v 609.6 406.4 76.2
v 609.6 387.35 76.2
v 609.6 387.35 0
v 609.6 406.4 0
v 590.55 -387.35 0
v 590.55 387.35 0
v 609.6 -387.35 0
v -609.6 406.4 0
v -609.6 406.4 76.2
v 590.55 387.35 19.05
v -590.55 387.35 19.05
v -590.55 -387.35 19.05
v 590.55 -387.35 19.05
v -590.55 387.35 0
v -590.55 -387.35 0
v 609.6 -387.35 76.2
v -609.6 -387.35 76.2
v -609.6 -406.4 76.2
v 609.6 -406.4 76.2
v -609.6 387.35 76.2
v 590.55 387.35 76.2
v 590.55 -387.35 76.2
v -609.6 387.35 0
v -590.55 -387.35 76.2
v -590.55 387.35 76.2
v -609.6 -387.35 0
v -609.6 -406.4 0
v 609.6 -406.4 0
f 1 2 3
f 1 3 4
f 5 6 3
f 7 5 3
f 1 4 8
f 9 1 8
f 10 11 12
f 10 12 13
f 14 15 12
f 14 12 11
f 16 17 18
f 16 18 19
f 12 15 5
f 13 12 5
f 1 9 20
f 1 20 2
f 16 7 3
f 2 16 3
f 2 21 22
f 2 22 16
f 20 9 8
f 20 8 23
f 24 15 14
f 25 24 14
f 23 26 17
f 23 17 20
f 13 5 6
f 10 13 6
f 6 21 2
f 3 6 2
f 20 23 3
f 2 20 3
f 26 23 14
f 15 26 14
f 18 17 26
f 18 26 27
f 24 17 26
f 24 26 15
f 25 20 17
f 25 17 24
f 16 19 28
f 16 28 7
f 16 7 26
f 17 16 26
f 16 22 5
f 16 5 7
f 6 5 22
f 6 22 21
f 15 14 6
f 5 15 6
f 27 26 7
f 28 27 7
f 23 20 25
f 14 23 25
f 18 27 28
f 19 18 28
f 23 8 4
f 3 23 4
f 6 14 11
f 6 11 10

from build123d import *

# Parameters (mm, degrees)
F2_W     = 1181.1
F2_H     = 774.7
F3_DEPTH = 19.05
F5_DEPTH = 76.2
F7_W     = 19.05
F7_H     = 774.7
F8_DEPTH = 76.2


with BuildPart() as f3:
    # F2 (on Top) → F3 (new body, through all)
    with BuildSketch(Plane.XY):
        Rectangle(F2_W, F2_H)
    extrude(amount=F3_DEPTH)


with BuildPart() as f5:
    # F4 (on Top) → F5 (new body, through all)
    with BuildSketch(Plane.XY):
        Polygon((590.55, -387.35), (-590.55, -387.35), (-609.6, -387.35), (-609.6, -406.4), (609.6, -406.4), (609.6, -387.35), align=None)
    extrude(amount=F5_DEPTH)


with BuildPart() as f5b:
    # F4 (on Top) → F5, piece 2 (new body, through all)
    with BuildSketch(Plane.XY):
        Polygon((-609.6, 406.4), (-609.6, 387.35), (-590.55, 387.35), (590.55, 387.35), (609.6, 387.35), (609.6, 406.4), align=None)
    extrude(amount=F5_DEPTH)


with BuildPart() as f8:
    # F7 (on Top) → F8 (new body, through all)
    with BuildSketch(Plane.XY):
        with Locations((600.075, 0)):
            Rectangle(F7_W, F7_H)
    extrude(amount=F8_DEPTH)


with BuildPart() as f8b:
    # F7 (on Top) → F8, piece 2 (new body, through all)
    with BuildSketch(Plane.XY):
        with Locations((-600.075, 0)):
            Rectangle(F7_W, F7_H)
    extrude(amount=F8_DEPTH)


solid = Compound([f3.part, f5.part, f5b.part, f8.part, f8b.part])
